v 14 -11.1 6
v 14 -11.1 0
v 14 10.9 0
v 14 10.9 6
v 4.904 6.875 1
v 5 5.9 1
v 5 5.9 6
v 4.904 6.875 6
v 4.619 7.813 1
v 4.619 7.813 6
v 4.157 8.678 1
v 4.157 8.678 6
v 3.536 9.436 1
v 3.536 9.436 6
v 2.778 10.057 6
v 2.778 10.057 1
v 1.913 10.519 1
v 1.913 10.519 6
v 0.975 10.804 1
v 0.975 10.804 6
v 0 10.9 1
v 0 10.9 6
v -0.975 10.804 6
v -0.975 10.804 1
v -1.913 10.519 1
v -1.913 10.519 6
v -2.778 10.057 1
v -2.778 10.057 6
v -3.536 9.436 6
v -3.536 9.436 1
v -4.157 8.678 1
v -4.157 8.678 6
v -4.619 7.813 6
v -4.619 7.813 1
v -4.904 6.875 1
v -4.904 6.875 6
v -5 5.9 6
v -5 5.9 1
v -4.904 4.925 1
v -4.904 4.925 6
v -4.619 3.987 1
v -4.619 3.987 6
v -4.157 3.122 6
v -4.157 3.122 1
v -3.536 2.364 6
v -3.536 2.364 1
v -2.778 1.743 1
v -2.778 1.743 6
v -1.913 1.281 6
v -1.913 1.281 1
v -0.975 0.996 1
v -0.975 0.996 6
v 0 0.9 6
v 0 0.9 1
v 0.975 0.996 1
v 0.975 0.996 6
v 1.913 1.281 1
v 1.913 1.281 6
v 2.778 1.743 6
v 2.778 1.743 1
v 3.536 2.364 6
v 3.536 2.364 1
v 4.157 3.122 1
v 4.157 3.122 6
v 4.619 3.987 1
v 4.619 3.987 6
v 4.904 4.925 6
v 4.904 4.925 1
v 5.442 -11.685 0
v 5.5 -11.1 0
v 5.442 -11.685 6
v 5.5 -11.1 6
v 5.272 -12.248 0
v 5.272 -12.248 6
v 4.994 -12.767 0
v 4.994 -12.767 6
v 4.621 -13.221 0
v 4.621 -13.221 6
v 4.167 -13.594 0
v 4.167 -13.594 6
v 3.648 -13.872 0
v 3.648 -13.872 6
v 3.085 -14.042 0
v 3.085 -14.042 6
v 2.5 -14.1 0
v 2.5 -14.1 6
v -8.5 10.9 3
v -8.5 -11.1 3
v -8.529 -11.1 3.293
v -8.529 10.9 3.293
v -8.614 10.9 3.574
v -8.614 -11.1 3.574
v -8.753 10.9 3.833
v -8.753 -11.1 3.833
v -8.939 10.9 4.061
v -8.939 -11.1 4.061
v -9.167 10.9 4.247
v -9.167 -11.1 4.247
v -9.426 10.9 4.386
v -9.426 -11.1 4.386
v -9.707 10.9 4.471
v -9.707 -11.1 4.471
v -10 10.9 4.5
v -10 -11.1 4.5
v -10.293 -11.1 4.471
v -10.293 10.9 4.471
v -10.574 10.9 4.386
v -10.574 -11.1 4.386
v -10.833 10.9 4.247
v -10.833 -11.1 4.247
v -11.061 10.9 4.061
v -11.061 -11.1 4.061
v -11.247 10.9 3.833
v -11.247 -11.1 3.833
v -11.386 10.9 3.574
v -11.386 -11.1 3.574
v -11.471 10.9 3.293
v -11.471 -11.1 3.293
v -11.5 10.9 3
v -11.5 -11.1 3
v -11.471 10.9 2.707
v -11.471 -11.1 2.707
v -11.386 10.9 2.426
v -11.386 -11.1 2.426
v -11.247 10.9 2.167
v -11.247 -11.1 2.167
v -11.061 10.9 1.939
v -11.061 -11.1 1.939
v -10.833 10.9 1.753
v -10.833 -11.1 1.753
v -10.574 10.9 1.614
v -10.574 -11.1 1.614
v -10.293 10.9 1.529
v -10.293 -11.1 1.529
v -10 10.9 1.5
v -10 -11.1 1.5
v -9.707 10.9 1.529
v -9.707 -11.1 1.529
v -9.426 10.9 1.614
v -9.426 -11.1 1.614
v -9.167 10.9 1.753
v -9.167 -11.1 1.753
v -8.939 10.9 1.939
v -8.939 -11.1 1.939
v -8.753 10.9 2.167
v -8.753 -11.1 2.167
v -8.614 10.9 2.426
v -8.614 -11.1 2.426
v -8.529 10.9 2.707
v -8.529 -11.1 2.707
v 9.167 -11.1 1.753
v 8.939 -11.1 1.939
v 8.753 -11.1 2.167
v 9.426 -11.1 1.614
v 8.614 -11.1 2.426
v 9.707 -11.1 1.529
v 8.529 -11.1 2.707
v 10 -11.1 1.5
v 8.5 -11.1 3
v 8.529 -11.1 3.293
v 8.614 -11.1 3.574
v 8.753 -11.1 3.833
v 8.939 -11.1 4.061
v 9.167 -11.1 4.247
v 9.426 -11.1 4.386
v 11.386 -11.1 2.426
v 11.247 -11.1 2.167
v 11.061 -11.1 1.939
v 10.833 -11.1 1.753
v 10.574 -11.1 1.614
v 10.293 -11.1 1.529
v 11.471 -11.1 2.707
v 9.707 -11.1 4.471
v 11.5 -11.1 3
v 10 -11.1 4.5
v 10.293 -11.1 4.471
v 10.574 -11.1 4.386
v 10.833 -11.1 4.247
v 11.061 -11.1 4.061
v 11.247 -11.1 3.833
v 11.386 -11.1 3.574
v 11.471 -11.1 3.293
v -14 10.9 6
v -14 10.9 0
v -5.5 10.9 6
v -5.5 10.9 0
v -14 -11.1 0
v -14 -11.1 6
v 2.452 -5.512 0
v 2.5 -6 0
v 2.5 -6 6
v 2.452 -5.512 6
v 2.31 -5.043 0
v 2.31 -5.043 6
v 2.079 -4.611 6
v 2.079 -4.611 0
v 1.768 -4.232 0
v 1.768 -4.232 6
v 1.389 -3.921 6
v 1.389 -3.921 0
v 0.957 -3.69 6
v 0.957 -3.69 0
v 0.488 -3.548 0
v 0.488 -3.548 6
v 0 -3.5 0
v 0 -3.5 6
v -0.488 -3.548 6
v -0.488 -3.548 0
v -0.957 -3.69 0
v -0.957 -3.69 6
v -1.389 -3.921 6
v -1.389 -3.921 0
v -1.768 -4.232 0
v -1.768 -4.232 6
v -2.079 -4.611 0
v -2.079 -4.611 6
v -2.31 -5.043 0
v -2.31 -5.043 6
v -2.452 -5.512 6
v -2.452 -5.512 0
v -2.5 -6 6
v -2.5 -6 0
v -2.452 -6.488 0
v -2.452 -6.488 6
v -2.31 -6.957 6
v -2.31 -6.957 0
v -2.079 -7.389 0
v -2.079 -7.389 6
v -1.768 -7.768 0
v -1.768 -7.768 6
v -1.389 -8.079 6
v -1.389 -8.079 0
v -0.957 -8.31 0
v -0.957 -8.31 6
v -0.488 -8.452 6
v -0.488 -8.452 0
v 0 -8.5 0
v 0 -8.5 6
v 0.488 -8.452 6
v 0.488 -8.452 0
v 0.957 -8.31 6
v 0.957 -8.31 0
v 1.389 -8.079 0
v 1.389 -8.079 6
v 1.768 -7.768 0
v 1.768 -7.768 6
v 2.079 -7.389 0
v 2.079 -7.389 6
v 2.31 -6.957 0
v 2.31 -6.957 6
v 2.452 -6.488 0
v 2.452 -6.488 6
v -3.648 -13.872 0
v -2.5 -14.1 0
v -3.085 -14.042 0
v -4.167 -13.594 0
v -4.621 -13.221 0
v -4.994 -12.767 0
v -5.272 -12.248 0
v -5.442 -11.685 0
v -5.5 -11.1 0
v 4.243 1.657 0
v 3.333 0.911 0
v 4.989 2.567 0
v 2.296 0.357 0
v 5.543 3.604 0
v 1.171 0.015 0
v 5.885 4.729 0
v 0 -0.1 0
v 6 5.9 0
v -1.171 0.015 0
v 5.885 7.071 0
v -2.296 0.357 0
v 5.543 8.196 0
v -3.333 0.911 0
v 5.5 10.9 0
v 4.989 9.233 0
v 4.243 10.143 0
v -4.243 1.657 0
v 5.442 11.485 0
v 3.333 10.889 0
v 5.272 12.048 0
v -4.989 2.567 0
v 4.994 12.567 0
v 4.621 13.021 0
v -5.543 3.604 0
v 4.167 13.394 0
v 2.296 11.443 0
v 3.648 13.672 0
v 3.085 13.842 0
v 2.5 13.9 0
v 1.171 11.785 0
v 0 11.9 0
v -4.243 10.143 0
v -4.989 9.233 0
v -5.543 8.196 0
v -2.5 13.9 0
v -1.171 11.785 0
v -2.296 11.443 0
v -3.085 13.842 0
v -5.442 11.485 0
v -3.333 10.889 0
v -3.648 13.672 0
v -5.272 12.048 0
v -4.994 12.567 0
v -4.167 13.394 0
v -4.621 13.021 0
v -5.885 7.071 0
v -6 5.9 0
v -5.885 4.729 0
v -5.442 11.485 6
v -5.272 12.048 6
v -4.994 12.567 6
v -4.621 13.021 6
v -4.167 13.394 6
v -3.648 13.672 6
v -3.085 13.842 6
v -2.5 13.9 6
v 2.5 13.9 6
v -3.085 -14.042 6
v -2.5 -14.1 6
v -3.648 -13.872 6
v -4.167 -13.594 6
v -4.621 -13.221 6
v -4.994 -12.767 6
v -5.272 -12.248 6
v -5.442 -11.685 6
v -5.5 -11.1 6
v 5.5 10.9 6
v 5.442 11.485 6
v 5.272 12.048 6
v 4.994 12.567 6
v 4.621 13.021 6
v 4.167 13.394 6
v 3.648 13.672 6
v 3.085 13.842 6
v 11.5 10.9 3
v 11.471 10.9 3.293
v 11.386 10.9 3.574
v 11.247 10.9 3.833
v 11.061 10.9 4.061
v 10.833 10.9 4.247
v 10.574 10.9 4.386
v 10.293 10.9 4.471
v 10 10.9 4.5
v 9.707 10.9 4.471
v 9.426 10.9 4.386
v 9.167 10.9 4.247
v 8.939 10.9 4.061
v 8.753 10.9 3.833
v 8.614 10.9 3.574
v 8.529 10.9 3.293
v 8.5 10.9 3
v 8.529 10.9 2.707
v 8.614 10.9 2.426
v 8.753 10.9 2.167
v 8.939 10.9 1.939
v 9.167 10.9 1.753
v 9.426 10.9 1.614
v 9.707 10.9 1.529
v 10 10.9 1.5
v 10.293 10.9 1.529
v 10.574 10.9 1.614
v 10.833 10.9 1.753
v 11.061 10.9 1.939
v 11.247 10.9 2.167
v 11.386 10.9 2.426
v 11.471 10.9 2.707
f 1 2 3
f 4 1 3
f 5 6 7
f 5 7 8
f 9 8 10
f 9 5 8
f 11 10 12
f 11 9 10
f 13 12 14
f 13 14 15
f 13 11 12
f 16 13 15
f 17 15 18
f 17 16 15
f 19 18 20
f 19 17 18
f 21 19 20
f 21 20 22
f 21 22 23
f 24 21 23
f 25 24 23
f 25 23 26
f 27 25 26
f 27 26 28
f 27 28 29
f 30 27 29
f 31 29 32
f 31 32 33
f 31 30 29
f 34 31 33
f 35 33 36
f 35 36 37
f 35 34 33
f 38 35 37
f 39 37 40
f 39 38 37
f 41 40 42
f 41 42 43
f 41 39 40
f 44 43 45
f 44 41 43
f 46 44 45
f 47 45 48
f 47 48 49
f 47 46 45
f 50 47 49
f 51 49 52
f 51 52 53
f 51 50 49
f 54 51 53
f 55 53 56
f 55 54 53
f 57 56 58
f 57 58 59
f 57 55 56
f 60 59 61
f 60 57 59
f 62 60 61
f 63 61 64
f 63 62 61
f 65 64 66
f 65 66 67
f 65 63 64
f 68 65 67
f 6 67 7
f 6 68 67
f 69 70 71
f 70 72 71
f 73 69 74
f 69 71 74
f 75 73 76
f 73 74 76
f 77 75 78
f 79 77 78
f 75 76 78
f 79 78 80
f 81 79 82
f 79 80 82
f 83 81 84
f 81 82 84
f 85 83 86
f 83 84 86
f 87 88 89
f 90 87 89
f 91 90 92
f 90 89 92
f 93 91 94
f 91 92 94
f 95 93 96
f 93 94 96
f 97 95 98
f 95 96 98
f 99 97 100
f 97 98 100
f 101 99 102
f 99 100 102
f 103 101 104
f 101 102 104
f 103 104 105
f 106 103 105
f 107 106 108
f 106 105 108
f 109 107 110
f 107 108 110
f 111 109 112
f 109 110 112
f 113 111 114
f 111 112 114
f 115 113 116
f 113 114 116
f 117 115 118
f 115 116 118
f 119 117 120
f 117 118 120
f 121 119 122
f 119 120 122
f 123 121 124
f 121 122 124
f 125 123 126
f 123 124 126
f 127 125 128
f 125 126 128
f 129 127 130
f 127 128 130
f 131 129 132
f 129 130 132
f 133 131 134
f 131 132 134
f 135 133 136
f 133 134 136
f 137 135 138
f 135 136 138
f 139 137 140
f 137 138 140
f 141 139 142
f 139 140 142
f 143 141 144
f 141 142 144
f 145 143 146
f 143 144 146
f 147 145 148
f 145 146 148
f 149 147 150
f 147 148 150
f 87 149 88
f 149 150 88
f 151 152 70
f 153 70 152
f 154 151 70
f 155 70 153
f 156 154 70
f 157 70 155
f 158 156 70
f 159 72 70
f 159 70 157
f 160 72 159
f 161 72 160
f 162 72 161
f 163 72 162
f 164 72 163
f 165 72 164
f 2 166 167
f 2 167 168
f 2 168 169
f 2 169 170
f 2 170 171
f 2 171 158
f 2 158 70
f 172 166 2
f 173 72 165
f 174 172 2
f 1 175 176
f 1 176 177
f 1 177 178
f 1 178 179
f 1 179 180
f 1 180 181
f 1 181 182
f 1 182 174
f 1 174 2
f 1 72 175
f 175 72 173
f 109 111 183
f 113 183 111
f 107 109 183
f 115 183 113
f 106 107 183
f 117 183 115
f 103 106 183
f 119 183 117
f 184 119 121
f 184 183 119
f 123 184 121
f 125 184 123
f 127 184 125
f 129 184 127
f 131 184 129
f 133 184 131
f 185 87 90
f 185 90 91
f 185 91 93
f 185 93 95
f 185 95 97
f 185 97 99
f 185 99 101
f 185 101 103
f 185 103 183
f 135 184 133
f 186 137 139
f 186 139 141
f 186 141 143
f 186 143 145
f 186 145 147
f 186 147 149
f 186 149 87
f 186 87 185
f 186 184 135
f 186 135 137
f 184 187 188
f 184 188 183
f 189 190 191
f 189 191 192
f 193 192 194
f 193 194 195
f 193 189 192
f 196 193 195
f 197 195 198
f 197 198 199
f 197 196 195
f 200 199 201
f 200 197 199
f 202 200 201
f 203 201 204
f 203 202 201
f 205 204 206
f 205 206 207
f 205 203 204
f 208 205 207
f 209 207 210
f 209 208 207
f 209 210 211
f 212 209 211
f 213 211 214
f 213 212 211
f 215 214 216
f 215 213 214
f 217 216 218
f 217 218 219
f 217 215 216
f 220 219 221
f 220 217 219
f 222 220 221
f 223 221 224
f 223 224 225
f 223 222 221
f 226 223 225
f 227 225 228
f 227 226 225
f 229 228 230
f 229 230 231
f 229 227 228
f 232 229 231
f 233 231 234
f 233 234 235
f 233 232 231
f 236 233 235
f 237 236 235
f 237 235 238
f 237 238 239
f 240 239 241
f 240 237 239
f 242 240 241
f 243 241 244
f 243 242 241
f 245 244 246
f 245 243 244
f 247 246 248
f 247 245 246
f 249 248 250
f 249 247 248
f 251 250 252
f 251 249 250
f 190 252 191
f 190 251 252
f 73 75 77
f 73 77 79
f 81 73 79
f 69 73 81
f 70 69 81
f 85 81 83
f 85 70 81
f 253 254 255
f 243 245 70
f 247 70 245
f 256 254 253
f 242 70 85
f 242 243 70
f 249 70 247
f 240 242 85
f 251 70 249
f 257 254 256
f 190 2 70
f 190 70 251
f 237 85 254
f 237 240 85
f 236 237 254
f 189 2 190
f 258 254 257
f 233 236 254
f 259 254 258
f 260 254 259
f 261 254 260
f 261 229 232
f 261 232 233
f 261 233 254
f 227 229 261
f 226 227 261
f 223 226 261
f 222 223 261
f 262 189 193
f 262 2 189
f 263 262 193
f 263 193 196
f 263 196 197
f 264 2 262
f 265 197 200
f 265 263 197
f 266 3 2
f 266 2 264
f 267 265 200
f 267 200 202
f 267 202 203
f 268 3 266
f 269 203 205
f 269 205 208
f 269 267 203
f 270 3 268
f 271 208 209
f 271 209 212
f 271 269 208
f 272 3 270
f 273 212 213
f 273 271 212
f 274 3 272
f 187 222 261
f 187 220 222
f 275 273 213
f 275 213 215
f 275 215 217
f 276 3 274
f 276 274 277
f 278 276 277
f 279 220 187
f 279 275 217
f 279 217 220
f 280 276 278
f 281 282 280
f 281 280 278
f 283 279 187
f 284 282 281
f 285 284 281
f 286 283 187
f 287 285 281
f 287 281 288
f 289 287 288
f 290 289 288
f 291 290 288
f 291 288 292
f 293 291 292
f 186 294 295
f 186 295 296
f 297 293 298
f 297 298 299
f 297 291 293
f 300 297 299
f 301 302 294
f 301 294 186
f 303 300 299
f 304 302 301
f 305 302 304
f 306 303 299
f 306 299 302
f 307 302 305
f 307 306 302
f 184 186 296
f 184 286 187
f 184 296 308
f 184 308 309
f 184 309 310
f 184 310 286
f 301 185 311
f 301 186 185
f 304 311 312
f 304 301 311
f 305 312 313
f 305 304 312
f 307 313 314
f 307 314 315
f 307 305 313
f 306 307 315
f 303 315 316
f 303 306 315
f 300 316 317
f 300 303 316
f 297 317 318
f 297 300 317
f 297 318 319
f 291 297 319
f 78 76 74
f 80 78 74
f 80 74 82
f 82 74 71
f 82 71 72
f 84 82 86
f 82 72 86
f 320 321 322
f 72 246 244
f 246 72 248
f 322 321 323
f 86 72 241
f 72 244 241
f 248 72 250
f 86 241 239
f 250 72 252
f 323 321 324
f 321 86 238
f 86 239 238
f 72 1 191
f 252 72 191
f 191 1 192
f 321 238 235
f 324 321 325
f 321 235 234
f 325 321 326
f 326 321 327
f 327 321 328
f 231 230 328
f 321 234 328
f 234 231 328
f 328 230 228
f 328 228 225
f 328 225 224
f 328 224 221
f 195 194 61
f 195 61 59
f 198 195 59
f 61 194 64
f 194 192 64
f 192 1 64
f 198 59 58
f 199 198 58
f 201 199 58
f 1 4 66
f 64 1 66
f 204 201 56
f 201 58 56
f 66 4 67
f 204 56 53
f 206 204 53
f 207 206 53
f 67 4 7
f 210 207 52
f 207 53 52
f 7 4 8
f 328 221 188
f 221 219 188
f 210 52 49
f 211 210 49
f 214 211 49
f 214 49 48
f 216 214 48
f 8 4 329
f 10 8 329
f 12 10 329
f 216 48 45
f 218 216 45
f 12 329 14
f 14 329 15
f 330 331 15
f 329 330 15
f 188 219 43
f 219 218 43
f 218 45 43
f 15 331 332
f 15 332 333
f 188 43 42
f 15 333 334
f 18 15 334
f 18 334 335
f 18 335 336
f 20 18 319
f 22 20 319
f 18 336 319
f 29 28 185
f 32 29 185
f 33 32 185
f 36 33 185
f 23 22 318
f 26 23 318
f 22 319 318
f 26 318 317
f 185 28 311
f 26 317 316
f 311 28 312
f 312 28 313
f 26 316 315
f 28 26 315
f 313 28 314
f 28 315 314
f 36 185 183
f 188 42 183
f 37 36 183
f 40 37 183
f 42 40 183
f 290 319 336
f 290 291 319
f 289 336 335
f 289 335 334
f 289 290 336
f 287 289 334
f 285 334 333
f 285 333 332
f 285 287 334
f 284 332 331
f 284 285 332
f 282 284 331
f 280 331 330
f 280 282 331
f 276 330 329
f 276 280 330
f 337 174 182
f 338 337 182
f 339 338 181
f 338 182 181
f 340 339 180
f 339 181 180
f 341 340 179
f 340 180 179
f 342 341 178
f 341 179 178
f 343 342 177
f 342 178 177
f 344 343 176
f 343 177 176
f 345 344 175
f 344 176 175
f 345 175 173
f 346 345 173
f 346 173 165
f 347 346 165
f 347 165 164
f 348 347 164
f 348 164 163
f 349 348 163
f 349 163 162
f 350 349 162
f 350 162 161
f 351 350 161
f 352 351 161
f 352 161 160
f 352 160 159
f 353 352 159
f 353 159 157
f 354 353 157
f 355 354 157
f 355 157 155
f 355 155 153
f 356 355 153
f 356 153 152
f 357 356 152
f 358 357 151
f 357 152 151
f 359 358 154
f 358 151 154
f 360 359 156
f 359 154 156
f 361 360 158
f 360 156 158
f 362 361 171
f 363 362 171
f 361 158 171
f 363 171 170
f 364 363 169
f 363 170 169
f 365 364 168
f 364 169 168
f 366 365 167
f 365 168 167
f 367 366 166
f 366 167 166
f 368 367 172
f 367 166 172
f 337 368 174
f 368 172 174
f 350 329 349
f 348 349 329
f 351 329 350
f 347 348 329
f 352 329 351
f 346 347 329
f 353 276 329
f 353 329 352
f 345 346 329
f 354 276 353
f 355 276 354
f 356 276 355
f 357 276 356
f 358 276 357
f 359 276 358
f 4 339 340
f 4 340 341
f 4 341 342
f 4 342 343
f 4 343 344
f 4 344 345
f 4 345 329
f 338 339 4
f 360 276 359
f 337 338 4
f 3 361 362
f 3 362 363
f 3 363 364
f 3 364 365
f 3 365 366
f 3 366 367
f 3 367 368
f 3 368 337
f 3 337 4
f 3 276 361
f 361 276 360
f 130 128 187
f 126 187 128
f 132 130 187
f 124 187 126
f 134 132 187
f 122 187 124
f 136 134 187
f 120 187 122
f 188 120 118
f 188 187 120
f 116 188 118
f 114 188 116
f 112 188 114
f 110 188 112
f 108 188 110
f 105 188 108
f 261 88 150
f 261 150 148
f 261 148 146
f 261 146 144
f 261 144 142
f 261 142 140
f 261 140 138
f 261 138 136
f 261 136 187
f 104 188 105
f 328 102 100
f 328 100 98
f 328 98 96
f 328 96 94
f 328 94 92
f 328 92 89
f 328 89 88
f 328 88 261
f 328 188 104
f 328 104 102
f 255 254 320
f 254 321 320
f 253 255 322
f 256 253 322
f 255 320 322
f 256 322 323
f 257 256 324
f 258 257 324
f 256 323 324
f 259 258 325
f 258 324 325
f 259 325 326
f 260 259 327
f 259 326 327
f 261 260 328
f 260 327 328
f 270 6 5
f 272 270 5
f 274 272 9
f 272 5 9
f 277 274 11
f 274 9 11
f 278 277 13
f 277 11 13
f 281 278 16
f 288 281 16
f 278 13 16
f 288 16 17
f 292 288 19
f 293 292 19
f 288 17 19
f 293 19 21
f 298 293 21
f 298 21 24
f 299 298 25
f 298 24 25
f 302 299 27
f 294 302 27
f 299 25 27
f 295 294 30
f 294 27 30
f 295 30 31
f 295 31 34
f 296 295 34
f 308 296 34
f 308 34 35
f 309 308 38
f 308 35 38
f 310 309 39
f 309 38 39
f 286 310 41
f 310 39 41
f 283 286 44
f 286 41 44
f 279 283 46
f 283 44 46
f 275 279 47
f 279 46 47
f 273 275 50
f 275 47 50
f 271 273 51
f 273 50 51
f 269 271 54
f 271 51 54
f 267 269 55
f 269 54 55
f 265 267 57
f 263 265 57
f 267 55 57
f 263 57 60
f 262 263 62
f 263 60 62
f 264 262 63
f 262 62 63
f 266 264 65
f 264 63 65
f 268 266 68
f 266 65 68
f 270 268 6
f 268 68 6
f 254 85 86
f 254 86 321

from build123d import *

# Parameters (mm, degrees)
SKETCH_1_W          = 28
SKETCH_1_H          = 28
SKETCH_1_R          = 2.5
SKETCH_1_R_2        = 5
EXTRUDE_1_DEPTH     = 6
SKETCH_2_R          = 1.5
CUT_EXTRUDE_1_DEPTH = 32.874754901
CHAMFER_2_SIZE      = 1
SKETCH_8_W          = 28
SKETCH_8_H          = 0.1
EXTRUDE_4_DEPTH     = 6
SKETCH_9_W          = 28
SKETCH_9_H          = 0.1
CUT_EXTRUDE_4_DEPTH = 21.755962999
SKETCH_10_R         = 1.5
CUT_EXTRUDE_5_DEPTH = 32.874754901
CUT_EXTRUDE_START   = -3
SKETCH_11_W         = 9
SKETCH_11_H         = 10
SKETCH_11_R         = 1.5
CUT_EXTRUDE_6_DEPTH = 3
SKETCH_12_W         = 9
SKETCH_12_H         = 9
SKETCH_12_R         = 1.5
CUT_EXTRUDE_7_DEPTH = 3
FILLET_1_R          = 3


with BuildPart() as part:
    # 草图1 → 凸台-拉伸1 (new body)
    with BuildSketch(Plane.XY):
        Rectangle(SKETCH_1_W, SKETCH_1_H)
        with Locations((0, -6)):
            Circle(SKETCH_1_R, mode=Mode.SUBTRACT)
        with Locations((0, 5.9)):
            Circle(SKETCH_1_R_2, mode=Mode.SUBTRACT)
    extrude(amount=EXTRUDE_1_DEPTH)

    # 草图2 → 切除-拉伸1 (cut, through all)
    with BuildSketch(Plane(origin=(0, -14, 0), x_dir=(-1, 0, 0), z_dir=(0, -1, 0))):
        with Locations(Location((10, -3, 0), (0, 0, 180))):
            Circle(SKETCH_2_R)
        with Locations(Location((-10, -3, 0), (0, 0, 180))):
            Circle(SKETCH_2_R)
    extrude(amount=-CUT_EXTRUDE_1_DEPTH, mode=Mode.SUBTRACT)

    # 倒角2
    chamfer_2_edges = [part.edges().sort_by_distance(p)[0] for p in [
        (-5, 5.9, 0),
    ]]
    chamfer(chamfer_2_edges, length=CHAMFER_2_SIZE)

    # 草图8 → 凸台-拉伸4 (add)
    with BuildSketch(Plane(origin=(0, 0, 0), x_dir=(-1, 0, 0), z_dir=(0, 0, -1))):
        with Locations((0, -14.05)):
            Rectangle(SKETCH_8_W, SKETCH_8_H)
    extrude(amount=-EXTRUDE_4_DEPTH)

    # 草图9 → 切除-拉伸4 (cut, through all)
    with BuildSketch(Plane.XY.offset(6)):
        with Locations((0, 13.95)):
            Rectangle(SKETCH_9_W, SKETCH_9_H)
    extrude(amount=-CUT_EXTRUDE_4_DEPTH, mode=Mode.SUBTRACT)

    # 草图10 → 切除-拉伸5 (cut, through all)
    with BuildSketch(Plane(origin=(0, 13.9, 0), x_dir=(1, 0, 0), z_dir=(0, 1, 0))):
        with Locations(Location((-10, -3, 0), (0, 0, 90))):
            Circle(SKETCH_10_R)
        with Locations(Location((10, -3, 0), (0, 0, 90))):
            Circle(SKETCH_10_R)
    extrude(amount=-CUT_EXTRUDE_5_DEPTH, mode=Mode.SUBTRACT)

    # 草图11 → 切除-拉伸6 (cut)
    # profile 1 of 2: a face of its own
    with BuildSketch(Plane(origin=(0, 13.9, 0), x_dir=(1, 0, 0), z_dir=(0, 1, 0)).offset(CUT_EXTRUDE_START)):
        with Locations((-10, -3)):
            Rectangle(SKETCH_11_W, SKETCH_11_H)
        with Locations(Location((-10, -3, 0), (0, 0, 270))):
            Circle(SKETCH_11_R, mode=Mode.SUBTRACT)
    # profile 2 of 2: a face of its own
    with BuildSketch(Plane(origin=(0, 13.9, 0), x_dir=(1, 0, 0), z_dir=(0, 1, 0)).offset(CUT_EXTRUDE_START)):
        with Locations((10, -3)):
            Rectangle(SKETCH_11_W, SKETCH_11_H)
    extrude(amount=CUT_EXTRUDE_6_DEPTH, mode=Mode.SUBTRACT)

    # 草图12 → 切除-拉伸7 (cut)
    # profile 1 of 2: a face of its own
    with BuildSketch(Plane.XZ.offset(14.1)):
        with Locations((-10, 3)):
            Rectangle(SKETCH_12_W, SKETCH_12_H)
        with Locations(Location((-10, 3, 0), (0, 0, 270))):
            Circle(SKETCH_12_R, mode=Mode.SUBTRACT)
    # profile 2 of 2: a face of its own
    with BuildSketch(Plane.XZ.offset(14.1)):
        with Locations((10, 3)):
            Rectangle(SKETCH_12_W, SKETCH_12_H)
    extrude(amount=-CUT_EXTRUDE_7_DEPTH, mode=Mode.SUBTRACT)

    # 圆角1
    fillet_1_edges = [part.edges().sort_by_distance(p)[0] for p in [
        (5.5, -14.1, 3),
        (-5.5, -14.1, 3),
        (5.5, 13.9, 3),
        (-5.5, 13.9, 3),
    ]]
    fillet(fillet_1_edges, radius=FILLET_1_R - 0.0001)  # a hair under: the kernel refuses the full size


solid = part.part
